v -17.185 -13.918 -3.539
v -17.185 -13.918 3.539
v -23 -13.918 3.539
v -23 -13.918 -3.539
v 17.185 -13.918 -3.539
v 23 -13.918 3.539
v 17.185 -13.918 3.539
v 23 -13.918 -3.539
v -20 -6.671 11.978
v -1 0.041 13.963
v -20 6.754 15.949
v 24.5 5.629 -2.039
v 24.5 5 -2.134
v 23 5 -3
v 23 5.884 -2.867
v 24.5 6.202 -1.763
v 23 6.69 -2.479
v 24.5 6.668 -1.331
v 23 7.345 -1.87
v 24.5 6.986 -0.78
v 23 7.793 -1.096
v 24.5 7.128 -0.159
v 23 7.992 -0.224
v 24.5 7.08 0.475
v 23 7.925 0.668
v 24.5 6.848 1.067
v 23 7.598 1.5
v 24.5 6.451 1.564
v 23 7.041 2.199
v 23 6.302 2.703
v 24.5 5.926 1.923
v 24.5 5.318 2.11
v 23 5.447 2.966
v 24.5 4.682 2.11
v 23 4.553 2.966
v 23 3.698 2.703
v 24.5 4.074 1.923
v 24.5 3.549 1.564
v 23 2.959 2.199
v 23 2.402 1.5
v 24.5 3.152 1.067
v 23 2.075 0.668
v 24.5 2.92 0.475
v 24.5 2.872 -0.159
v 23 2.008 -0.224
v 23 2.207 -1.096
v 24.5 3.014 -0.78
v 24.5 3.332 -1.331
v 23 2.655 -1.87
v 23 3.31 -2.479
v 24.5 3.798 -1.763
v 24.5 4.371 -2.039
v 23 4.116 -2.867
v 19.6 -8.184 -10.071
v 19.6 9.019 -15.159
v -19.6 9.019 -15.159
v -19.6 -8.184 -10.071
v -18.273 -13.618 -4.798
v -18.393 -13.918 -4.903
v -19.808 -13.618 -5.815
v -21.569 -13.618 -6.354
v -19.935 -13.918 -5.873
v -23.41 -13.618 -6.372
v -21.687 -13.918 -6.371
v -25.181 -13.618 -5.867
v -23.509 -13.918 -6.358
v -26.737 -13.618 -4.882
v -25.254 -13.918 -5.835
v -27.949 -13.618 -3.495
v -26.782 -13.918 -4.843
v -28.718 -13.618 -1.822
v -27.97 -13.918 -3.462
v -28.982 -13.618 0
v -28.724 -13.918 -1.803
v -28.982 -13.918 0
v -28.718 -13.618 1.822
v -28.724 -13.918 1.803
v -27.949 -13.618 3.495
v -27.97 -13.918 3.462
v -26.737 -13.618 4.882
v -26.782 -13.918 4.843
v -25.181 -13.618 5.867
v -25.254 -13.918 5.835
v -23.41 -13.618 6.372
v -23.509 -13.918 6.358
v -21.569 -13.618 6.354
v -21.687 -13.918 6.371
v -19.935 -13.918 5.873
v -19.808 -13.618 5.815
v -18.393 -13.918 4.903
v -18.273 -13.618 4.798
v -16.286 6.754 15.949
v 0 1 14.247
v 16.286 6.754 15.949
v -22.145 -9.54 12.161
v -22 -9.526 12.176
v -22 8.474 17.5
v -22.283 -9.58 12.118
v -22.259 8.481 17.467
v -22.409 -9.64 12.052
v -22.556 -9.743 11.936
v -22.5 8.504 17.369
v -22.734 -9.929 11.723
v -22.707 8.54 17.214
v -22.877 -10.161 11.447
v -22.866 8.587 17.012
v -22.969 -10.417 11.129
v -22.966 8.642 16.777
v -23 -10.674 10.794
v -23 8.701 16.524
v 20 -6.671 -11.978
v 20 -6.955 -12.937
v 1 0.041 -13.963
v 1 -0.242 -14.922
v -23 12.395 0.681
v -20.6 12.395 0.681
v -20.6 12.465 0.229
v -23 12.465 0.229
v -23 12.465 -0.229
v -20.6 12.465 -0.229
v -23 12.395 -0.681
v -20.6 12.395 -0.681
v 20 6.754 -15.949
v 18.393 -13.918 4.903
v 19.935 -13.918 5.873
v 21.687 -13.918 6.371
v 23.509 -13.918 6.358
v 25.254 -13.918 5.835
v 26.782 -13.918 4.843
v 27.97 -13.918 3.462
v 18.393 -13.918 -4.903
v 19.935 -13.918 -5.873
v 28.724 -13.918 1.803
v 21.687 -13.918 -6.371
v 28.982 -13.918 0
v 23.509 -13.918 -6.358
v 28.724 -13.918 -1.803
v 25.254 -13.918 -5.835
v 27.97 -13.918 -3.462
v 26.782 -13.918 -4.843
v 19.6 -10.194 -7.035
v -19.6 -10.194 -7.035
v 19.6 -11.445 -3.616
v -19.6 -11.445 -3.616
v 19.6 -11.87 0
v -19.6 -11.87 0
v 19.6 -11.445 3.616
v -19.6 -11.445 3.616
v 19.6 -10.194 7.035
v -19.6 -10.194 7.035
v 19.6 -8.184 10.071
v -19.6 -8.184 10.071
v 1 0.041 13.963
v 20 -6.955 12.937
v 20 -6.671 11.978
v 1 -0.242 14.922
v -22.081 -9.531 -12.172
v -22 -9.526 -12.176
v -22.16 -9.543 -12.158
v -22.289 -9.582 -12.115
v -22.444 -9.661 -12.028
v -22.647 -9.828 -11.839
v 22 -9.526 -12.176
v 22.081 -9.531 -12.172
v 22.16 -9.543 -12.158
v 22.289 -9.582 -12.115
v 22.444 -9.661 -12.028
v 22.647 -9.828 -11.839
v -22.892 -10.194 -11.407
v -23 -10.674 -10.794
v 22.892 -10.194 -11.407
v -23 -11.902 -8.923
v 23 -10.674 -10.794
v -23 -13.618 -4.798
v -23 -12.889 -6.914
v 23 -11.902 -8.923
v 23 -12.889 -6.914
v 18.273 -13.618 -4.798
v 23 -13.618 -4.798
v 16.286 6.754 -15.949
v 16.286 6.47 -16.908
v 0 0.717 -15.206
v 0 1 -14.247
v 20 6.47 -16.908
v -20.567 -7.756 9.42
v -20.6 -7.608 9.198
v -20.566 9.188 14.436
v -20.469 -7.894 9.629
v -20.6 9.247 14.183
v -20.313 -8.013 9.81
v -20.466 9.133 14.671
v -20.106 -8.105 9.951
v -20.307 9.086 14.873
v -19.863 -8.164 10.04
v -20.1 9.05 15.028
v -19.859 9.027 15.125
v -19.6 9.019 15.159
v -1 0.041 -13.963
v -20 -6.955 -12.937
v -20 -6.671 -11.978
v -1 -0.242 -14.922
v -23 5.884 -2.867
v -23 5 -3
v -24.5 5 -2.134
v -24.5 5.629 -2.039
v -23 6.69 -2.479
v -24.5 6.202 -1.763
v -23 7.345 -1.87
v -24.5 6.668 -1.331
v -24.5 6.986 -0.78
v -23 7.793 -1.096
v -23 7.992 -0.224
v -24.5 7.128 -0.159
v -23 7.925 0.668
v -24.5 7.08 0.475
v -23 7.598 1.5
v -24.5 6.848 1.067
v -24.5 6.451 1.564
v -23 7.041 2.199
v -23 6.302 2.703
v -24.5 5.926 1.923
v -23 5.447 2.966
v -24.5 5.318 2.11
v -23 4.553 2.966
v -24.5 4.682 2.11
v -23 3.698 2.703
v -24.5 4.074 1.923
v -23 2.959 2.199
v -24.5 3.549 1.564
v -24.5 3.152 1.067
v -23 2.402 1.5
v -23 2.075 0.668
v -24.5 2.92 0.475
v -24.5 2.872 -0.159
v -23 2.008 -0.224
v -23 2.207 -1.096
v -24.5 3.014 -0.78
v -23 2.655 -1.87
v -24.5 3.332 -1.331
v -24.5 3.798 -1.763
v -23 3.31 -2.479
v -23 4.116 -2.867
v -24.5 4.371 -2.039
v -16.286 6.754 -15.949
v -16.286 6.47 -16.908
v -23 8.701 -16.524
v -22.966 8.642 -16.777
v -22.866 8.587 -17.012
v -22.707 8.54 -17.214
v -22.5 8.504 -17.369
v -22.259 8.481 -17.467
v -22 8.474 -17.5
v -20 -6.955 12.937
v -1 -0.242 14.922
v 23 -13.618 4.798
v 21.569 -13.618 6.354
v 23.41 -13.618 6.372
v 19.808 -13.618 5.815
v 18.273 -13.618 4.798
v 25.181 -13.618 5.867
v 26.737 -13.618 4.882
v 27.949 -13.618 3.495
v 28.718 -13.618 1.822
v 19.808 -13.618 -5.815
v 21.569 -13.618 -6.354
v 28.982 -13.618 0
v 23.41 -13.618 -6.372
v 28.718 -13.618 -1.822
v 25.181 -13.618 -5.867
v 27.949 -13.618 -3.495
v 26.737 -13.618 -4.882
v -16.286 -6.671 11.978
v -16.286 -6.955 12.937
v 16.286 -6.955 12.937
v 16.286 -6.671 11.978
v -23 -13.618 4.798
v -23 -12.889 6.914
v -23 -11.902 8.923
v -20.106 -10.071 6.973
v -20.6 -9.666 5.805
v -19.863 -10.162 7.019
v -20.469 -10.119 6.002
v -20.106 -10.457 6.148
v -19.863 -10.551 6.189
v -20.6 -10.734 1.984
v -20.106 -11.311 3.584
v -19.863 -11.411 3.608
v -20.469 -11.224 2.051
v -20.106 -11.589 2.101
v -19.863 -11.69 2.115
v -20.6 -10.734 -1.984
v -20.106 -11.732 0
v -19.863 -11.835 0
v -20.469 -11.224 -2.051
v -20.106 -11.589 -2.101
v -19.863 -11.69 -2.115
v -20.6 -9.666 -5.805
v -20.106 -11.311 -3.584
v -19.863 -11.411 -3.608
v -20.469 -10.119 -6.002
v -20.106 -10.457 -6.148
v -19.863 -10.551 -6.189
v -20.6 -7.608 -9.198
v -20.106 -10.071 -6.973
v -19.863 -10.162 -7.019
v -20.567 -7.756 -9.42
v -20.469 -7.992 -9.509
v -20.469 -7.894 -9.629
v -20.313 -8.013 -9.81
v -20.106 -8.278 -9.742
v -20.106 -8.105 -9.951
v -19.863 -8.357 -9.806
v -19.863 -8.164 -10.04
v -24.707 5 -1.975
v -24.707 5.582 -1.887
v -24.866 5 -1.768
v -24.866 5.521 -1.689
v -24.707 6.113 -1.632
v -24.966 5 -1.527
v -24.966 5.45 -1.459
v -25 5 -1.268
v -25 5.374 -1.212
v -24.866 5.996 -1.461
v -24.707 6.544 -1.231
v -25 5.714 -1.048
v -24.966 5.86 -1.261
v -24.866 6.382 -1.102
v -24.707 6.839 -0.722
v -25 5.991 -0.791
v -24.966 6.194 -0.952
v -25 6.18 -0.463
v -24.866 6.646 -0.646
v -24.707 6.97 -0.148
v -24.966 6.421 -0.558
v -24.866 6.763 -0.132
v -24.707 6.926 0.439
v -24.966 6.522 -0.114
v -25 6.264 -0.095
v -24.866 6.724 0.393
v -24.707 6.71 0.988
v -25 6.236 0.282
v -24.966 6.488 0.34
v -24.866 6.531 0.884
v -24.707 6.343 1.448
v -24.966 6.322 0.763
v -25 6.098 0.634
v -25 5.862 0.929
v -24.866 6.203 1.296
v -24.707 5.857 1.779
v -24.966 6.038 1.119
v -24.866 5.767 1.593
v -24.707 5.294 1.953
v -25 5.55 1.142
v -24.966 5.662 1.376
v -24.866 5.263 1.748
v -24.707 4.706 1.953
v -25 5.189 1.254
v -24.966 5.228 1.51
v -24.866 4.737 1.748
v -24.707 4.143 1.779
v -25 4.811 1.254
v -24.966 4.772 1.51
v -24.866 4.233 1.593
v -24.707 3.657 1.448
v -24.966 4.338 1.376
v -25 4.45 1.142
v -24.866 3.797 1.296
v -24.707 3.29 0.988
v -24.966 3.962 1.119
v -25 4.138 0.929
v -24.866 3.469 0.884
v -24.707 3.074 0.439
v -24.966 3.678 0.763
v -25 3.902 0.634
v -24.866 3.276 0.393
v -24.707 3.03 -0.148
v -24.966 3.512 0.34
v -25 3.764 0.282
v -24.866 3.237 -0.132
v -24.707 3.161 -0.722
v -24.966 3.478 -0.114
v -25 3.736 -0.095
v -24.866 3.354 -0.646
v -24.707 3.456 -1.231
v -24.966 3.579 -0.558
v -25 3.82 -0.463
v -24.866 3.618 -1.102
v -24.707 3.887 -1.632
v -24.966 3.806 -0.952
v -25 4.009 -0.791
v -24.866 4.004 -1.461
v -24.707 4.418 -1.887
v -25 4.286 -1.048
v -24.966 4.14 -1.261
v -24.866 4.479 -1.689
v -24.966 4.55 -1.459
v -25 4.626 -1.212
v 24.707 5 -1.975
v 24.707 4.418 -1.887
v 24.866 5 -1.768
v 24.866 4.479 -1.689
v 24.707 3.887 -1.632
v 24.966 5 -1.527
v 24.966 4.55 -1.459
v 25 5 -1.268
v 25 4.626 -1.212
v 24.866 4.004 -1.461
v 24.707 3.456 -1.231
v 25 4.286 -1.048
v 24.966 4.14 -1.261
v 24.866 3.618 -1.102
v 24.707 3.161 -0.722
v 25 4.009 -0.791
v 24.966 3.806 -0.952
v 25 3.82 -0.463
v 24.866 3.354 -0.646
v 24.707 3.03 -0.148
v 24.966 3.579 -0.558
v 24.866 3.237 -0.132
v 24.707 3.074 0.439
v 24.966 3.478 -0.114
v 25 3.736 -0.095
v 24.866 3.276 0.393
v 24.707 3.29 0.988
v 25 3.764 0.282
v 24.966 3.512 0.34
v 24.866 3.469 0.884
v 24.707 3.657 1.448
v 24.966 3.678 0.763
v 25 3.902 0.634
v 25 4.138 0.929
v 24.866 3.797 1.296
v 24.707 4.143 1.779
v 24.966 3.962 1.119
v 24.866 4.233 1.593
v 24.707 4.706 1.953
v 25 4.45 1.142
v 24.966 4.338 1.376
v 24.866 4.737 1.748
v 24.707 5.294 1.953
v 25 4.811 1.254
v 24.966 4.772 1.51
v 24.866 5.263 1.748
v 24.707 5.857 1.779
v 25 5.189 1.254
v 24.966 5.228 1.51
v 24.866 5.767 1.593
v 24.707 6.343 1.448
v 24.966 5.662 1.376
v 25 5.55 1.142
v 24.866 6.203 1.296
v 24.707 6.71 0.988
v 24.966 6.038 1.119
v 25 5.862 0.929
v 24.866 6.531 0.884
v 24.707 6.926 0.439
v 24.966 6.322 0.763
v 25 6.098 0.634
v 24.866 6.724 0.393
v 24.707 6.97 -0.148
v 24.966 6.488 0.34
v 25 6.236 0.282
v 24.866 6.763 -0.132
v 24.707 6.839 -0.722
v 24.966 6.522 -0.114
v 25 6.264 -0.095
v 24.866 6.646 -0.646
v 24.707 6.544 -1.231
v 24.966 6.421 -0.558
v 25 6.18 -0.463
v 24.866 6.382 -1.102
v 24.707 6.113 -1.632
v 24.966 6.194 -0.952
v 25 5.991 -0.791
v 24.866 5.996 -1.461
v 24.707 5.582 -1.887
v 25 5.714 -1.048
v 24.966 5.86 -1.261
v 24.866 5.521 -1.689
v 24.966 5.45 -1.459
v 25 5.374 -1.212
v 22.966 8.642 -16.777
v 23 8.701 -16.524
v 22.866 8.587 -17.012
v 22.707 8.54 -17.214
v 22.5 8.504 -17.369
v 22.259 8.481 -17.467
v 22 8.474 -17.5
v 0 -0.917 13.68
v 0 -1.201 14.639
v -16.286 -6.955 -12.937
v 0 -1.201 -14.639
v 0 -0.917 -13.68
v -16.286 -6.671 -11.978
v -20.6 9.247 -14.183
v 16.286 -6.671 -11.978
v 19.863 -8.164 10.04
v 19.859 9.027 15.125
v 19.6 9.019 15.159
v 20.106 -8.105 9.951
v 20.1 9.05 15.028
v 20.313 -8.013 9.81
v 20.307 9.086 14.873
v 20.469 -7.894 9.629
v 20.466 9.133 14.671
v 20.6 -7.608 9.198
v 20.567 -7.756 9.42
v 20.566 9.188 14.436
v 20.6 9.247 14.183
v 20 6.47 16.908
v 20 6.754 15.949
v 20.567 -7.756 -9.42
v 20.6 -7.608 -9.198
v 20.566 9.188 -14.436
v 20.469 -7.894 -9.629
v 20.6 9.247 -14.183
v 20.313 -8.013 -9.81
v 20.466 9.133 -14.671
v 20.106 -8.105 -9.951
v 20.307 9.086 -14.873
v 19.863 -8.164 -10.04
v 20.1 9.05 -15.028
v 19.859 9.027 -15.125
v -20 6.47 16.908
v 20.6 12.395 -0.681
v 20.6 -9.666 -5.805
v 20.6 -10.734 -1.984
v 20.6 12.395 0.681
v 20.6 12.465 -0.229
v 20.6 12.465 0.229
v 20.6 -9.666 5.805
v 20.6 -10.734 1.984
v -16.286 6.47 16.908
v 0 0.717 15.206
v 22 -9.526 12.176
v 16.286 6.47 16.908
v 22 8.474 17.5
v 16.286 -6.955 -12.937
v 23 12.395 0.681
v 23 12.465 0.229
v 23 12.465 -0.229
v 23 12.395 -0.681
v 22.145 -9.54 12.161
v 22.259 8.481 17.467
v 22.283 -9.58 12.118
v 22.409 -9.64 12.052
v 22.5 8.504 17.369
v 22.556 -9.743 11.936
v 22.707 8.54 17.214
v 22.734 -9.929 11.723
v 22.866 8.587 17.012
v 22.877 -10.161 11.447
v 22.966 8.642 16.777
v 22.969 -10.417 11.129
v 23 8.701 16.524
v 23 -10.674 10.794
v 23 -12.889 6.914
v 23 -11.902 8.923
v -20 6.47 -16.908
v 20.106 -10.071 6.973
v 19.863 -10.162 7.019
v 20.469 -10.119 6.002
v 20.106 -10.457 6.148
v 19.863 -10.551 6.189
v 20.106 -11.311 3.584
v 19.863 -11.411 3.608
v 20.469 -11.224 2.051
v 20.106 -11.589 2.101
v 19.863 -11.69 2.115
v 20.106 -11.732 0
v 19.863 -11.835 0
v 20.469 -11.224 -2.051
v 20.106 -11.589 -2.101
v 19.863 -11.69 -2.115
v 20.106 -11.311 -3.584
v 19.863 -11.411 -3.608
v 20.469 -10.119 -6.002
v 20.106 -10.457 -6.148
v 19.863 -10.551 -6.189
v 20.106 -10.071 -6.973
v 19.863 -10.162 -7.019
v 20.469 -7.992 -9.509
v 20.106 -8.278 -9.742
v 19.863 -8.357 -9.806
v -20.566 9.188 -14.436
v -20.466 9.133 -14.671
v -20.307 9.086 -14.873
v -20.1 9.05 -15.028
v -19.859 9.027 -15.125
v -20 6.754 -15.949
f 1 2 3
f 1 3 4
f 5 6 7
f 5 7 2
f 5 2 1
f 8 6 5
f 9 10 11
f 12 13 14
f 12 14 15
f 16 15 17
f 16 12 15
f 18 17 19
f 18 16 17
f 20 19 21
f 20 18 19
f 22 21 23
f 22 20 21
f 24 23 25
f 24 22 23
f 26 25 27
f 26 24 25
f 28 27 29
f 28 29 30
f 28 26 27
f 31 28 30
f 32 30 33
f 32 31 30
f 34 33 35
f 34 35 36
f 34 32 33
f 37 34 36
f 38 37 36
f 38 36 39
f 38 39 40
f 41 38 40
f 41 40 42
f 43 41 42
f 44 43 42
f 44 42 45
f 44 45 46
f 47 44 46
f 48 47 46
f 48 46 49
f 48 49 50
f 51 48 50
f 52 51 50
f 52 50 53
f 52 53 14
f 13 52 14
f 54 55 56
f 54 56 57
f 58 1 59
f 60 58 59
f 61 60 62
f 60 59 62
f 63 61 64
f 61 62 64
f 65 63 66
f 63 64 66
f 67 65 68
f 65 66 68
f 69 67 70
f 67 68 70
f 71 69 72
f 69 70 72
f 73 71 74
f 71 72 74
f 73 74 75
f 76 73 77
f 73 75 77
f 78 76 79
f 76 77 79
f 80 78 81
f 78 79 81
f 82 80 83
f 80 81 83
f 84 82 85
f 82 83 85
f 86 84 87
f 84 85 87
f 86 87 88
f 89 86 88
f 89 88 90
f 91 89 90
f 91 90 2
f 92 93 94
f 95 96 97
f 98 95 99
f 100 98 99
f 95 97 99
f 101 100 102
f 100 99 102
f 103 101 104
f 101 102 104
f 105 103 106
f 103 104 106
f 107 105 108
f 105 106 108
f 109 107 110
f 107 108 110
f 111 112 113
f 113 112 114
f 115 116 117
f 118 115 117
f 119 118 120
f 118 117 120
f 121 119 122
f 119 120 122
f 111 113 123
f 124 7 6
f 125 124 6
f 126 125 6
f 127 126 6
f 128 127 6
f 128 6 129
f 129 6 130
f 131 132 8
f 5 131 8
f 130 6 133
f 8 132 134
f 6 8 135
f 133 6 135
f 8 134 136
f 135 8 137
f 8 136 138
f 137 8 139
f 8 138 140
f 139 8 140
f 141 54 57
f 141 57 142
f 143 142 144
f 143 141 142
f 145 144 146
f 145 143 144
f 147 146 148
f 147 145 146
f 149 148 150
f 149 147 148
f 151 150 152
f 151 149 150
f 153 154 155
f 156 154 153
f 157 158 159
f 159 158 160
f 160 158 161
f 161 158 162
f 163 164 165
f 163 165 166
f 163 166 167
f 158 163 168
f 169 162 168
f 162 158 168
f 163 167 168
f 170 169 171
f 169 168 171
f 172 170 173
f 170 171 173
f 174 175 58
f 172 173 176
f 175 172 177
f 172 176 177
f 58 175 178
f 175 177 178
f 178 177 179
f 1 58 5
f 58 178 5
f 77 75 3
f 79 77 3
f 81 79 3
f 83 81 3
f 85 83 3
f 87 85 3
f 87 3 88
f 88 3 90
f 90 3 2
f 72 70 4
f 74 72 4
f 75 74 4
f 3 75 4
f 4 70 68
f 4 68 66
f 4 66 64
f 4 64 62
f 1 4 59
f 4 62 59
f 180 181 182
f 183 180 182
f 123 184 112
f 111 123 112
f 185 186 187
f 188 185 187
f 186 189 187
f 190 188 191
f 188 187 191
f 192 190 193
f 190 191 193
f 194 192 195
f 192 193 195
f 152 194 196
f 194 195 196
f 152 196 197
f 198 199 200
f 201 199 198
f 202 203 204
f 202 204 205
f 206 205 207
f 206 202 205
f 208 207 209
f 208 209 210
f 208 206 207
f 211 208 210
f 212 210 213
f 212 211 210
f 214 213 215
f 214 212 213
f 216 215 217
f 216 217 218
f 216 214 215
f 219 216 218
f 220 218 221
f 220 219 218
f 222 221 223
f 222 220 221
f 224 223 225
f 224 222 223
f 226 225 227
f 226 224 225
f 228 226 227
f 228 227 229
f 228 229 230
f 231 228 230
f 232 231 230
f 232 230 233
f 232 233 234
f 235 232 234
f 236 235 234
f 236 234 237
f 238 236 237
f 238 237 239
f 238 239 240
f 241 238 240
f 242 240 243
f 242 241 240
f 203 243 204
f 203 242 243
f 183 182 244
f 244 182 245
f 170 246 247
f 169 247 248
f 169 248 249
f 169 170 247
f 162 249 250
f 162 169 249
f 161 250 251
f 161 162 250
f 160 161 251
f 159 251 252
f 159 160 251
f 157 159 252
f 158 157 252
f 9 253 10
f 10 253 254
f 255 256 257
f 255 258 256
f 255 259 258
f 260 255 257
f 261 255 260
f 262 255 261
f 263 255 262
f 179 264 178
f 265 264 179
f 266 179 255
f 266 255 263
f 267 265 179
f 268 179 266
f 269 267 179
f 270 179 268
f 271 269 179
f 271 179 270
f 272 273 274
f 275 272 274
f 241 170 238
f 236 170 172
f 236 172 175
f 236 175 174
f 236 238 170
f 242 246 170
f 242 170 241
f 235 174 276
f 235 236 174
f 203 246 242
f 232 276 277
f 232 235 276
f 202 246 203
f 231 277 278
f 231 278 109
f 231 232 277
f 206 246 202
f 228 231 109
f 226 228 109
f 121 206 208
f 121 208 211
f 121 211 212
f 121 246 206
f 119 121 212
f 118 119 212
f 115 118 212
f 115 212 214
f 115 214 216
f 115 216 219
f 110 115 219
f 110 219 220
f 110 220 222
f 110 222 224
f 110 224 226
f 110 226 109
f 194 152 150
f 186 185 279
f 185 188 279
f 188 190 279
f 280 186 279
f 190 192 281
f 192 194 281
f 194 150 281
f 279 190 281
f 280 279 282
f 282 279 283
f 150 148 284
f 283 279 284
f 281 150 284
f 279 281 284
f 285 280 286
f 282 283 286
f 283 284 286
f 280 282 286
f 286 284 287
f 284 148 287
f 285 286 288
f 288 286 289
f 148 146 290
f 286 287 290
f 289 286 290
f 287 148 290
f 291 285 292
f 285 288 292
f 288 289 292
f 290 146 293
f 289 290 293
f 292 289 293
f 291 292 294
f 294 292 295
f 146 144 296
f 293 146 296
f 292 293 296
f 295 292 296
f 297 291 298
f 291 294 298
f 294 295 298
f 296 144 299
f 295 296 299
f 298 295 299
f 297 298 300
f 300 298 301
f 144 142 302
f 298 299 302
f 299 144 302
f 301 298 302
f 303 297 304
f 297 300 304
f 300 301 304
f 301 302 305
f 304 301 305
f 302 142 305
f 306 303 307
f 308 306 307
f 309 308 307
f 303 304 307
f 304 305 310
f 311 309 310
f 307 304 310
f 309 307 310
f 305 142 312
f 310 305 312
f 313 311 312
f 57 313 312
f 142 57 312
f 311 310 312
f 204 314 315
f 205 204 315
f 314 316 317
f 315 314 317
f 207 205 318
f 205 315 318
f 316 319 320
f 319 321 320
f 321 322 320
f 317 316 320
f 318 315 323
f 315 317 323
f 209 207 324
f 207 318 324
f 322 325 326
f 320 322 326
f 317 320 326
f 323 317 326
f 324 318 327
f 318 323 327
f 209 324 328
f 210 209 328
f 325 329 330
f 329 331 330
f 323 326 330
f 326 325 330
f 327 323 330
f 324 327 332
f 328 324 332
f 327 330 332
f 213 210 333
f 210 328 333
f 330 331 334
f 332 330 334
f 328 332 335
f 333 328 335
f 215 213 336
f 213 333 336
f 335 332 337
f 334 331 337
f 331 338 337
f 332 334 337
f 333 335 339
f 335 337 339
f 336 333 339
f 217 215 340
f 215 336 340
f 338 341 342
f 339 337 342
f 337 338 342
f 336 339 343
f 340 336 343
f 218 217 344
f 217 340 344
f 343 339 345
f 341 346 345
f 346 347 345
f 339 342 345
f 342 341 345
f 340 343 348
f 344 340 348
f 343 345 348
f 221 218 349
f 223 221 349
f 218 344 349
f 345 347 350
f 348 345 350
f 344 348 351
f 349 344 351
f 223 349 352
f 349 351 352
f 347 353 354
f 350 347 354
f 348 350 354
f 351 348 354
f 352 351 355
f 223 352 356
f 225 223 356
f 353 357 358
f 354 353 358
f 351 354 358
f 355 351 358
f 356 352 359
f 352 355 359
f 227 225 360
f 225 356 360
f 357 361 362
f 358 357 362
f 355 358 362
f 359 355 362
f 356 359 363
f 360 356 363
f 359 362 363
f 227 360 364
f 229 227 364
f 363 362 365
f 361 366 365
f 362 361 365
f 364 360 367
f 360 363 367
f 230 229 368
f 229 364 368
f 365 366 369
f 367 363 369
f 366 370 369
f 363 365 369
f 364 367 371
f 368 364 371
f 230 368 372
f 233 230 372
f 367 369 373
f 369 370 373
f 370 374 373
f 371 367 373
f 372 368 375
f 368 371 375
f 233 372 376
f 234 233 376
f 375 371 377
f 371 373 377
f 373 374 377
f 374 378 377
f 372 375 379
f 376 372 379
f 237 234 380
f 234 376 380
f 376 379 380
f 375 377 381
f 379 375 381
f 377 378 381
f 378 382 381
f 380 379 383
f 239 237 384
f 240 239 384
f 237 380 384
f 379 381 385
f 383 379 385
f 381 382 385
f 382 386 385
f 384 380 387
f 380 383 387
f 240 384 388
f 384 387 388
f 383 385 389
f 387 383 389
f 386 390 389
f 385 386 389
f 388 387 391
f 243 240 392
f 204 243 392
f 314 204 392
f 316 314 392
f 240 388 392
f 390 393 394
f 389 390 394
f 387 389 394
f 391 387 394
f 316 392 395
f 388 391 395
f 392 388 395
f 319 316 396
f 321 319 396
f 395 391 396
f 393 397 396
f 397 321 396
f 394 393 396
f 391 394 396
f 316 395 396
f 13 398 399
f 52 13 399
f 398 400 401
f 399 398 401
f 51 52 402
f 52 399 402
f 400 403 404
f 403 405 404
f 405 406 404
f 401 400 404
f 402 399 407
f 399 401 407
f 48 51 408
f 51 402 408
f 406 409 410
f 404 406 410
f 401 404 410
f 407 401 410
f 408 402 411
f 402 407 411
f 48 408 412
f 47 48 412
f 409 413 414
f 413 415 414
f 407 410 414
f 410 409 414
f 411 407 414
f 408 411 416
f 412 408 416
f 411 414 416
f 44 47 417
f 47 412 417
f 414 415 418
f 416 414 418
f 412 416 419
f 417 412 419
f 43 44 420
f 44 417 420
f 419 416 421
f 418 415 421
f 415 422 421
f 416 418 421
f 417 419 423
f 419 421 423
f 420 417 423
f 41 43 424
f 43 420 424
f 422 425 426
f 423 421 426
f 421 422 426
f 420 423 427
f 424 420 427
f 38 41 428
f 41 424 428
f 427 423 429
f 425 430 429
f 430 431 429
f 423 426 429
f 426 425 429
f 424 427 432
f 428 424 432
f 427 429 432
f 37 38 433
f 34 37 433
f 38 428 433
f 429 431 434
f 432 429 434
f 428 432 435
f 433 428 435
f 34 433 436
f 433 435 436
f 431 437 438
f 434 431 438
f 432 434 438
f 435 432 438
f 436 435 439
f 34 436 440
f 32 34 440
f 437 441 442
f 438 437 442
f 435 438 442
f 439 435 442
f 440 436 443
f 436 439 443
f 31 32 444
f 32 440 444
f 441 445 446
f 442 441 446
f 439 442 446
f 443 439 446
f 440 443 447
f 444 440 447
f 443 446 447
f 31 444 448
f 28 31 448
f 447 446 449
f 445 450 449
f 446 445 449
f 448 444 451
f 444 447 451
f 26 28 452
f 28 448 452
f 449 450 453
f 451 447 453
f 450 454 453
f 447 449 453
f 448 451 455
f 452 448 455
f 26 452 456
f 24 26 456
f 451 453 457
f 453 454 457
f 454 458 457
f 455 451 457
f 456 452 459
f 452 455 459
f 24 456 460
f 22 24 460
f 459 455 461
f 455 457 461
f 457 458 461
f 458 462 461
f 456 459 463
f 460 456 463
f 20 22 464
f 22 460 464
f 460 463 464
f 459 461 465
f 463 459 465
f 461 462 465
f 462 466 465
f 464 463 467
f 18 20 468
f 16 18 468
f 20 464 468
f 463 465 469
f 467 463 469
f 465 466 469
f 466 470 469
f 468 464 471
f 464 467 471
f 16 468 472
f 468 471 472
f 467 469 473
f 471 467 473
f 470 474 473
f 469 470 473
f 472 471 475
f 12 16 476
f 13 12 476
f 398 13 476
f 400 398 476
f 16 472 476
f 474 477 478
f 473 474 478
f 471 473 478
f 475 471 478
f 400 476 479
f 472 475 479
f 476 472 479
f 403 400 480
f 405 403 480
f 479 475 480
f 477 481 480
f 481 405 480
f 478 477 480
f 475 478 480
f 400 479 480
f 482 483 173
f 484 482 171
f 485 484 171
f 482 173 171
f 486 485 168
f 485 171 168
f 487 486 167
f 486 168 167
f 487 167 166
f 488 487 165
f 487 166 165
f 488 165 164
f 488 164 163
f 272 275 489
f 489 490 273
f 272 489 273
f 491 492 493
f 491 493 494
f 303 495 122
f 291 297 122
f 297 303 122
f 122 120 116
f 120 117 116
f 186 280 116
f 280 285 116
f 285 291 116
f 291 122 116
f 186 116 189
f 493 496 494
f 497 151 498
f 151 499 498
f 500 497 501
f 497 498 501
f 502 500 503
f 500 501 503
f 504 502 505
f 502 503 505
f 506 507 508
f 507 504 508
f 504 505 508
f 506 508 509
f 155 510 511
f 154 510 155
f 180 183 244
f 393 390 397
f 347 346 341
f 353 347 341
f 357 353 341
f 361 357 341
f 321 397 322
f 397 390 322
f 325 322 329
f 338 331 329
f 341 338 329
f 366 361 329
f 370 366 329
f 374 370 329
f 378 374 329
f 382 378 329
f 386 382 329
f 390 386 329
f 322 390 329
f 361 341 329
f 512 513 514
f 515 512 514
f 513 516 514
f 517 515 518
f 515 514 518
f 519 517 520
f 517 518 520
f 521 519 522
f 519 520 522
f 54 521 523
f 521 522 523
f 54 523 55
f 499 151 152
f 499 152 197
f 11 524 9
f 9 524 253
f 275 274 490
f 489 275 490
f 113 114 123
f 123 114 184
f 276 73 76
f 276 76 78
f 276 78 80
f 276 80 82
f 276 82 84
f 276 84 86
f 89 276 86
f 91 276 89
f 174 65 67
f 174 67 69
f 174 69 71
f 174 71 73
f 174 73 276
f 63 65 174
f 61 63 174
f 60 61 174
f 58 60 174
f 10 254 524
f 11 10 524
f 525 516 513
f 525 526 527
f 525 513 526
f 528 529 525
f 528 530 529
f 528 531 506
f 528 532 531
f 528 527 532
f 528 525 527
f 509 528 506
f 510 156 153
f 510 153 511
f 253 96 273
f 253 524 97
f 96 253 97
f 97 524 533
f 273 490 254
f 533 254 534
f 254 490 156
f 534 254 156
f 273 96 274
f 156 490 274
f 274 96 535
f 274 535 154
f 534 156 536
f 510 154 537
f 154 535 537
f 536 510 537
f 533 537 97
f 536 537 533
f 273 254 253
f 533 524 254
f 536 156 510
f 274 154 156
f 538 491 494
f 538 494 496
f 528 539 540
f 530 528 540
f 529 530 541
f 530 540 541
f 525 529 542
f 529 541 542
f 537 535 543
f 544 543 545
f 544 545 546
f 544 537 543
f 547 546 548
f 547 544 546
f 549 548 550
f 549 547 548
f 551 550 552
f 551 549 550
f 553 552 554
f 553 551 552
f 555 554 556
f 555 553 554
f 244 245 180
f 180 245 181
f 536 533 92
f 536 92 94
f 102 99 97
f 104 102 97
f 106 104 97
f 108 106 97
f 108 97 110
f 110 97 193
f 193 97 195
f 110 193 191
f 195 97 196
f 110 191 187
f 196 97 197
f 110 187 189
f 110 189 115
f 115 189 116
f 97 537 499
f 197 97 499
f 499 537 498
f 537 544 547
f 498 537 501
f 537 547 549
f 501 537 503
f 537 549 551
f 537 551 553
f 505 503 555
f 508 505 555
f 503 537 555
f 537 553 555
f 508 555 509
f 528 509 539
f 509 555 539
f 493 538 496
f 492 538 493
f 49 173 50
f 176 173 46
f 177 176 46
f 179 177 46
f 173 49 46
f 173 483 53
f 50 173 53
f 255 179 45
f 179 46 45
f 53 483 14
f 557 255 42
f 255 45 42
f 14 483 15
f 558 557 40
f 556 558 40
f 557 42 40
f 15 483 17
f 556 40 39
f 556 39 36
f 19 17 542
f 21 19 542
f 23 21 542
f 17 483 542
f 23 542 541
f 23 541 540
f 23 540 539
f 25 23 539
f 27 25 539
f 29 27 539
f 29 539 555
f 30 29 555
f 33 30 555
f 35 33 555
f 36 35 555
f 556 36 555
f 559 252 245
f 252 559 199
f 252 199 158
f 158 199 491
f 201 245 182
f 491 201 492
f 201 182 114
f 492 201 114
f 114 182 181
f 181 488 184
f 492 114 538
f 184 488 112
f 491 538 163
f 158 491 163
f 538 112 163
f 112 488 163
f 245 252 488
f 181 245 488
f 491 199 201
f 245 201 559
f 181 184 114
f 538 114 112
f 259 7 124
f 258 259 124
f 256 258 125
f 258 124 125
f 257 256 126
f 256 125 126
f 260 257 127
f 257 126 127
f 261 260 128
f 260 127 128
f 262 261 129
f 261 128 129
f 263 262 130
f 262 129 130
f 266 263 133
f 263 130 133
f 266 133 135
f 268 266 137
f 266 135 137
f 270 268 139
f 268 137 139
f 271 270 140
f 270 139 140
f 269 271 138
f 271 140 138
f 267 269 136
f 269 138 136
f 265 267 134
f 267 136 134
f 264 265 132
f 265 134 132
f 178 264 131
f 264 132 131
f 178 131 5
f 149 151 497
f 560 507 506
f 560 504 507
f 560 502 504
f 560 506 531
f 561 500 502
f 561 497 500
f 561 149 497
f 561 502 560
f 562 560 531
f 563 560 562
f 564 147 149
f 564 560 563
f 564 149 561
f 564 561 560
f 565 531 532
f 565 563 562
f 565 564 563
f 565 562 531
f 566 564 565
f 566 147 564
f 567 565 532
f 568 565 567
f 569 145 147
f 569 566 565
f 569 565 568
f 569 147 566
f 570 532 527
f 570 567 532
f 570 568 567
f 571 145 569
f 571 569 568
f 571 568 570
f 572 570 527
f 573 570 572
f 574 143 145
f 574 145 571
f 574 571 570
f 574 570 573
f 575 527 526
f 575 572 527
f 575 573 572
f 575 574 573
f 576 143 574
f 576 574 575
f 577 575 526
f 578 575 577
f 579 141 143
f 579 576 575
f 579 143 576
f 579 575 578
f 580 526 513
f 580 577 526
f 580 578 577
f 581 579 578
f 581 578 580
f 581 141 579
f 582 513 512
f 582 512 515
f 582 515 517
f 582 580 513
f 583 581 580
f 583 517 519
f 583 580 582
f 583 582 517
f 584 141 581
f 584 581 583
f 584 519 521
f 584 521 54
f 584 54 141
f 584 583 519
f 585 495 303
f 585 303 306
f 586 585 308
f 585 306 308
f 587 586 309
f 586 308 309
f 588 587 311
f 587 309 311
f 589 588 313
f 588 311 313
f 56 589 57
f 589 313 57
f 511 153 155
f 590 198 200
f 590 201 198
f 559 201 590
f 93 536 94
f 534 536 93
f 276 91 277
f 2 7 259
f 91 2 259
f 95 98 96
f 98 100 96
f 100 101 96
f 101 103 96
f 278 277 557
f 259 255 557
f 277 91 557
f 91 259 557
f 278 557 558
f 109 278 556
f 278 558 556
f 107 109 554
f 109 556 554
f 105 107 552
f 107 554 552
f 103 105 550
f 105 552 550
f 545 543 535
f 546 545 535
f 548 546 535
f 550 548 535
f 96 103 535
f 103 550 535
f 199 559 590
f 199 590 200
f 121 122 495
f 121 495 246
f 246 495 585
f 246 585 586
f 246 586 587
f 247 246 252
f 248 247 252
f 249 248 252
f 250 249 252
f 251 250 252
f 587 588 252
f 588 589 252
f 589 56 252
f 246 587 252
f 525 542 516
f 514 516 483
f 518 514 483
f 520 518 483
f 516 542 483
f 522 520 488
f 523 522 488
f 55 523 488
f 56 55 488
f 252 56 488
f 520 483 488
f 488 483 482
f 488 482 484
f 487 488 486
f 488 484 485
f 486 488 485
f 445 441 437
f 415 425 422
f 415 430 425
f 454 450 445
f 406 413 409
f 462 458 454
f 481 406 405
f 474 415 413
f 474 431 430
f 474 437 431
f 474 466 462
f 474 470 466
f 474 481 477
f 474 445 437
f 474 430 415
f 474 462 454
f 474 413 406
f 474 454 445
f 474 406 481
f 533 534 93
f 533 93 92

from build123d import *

# Parameters (mm, degrees)
BOSS_EXTRUDE1_DEPTH = 23
SHELL1_T            = -2.4
BOSS_EXTRUDE2_START = 23
SKETCH2_R           = 3
BOSS_EXTRUDE2_DEPTH = 2
BOSS_EXTRUDE2_TAPER = 30
BOSS_EXTRUDE3_START = -23
SKETCH2_2_R         = 3
BOSS_EXTRUDE3_DEPTH = 2
BOSS_EXTRUDE3_DRAFT = -30
FILLET1_R           = 1
CUT_EXTRUDE1_DEPTH  = 1
SKETCH4_W           = 40.50345243
SKETCH4_H           = 8.465012935
CUT_EXTRUDE2_DEPTH  = 50
BOSS_EXTRUDE4_START = -13.918462
SKETCH5_R           = 6.429553597
BOSS_EXTRUDE4_DEPTH = 0.3
FILLET2_R           = 1


with BuildPart() as part:
    # Sketch1 → Boss-Extrude1 (new, symmetric)
    with BuildSketch(Plane(origin=(0, 0, 0), x_dir=(0, 0, -1), z_dir=(1, 0, 0))):
        with BuildLine():
            Line((-12.176285942, -9.526430091), (-17.5, 8.473569909))
            Line((-17.5, 8.473569909), (-0.681235958, 12.395199175))
            ThreePointArc((-0.681235958, 12.395199175), (0, 12.473569909), (0.681235958, 12.395199175))
            Line((0.681235958, 12.395199175), (17.5, 8.473569909))
            Line((17.5, 8.473569909), (12.176285942, -9.526430091))
            ThreePointArc((12.176285942, -9.526430091), (0, -14.269806816), (-12.176285942, -9.526430091))
        make_face()
    extrude(amount=BOSS_EXTRUDE1_DEPTH, both=True)

    # Shell1
    shell1_openings = [part.faces().sort_by_distance(p)[0] for p in [
        (0, 10.434384542, 9.090617979),
        (0, 12.473569909, 0),
        (0, 10.434384542, -9.090617979),
    ]]
    offset(amount=SHELL1_T, openings=shell1_openings, kind=Kind.INTERSECTION)

    # Sketch2 → Boss-Extrude2 (add)
    with BuildSketch(Plane(origin=(0, 0, 0), x_dir=(0, 0, -1), z_dir=(1, 0, 0)).offset(BOSS_EXTRUDE2_START)):
        with Locations((0, 5)):
            Circle(SKETCH2_R)
    extrude(amount=BOSS_EXTRUDE2_DEPTH, taper=BOSS_EXTRUDE2_TAPER)


with BuildPart() as boss_extrude3_tool:
    # Sketch2<2> → Boss-Extrude3 (with draft: the straight prism first)
    with BuildSketch(Plane(origin=(0, 0, 0), x_dir=(0, 0, -1), z_dir=(1, 0, 0)).offset(BOSS_EXTRUDE3_START)):
        with Locations((0, 5)):
            Circle(SKETCH2_2_R)
    extrude(amount=-BOSS_EXTRUDE3_DEPTH)
    # Boss-Extrude3: the draft: its side faces are tilted about the plane it starts from
    boss_extrude3_sides = [boss_extrude3_tool.faces().sort_by_distance(p)[0] for p in [
        (-24, 5, 3),
    ]]
    draft(boss_extrude3_sides, Plane(origin=(0, 0, 0), x_dir=(0, 0, -1), z_dir=(1, 0, 0)).offset(BOSS_EXTRUDE3_START), BOSS_EXTRUDE3_DRAFT)


with BuildPart() as part_1:
    add(part.part)

    # Boss-Extrude3: add boss_extrude3_tool
    add(boss_extrude3_tool.part)

    # Fillet1
    fillet1_edges = [part_1.edges().sort_by_distance(p)[0] for p in [
        (23, -0.526430091, 14.838142971),
        (-20.6, -11.869806816, 0),
        (-20.6, 0.417860611, -12.614658399),
        (-20.6, 0.417860611, 12.614658399),
        (20.6, -11.869806816, 0),
        (20.6, 0.417860611, -12.614658399),
        (20.6, 0.417860611, 12.614658399),
        (-23, -0.526430091, 14.838142971),
        (23, -0.526430091, -14.838142971),
        (-23, -0.526430091, -14.838142971),
    ]]
    fillet(fillet1_edges, radius=FILLET1_R)

    # Sketch3 → Cut-Extrude1 (cut)
    with BuildSketch(Plane(origin=(0, -99.309611189, -14.378157577), x_dir=(1, 0, 0), z_dir=(0, 0.28361719382763534, -0.9589375826222152))):
        Polygon((-20, -96.309611189), (-1, -103.309611189), (-20, -110.309611189), align=None)
        Polygon((20, -110.309611189), (20, -96.309611189), (1, -103.309611189), align=None)
        Polygon((-16.285714286, -96.309611189), (16.285714286, -96.309611189), (0, -102.309611189), align=None)
        Polygon((-16.285714286, -110.309611189), (16.285714286, -110.309611189), (0, -104.309611189), align=None)
    cut_extrude1 = extrude(amount=CUT_EXTRUDE1_DEPTH, mode=Mode.SUBTRACT)

    # Mirror1: Cut-Extrude1 across plane
    add(cut_extrude1.mirror(Plane.XY), mode=Mode.SUBTRACT)

    # Sketch4 → Cut-Extrude2 (cut, symmetric)
    with BuildSketch(Plane(origin=(0, 0, 0), x_dir=(0, 0, -1), z_dir=(1, 0, 0))):
        with Locations((0, -18.150968344)):
            Rectangle(SKETCH4_W, SKETCH4_H)
    extrude(amount=CUT_EXTRUDE2_DEPTH, both=True, mode=Mode.SUBTRACT)

    # Sketch5 → Boss-Extrude4 (add)
    with BuildSketch(Plane(origin=(0, 0, 0), x_dir=(1, 0, 0), z_dir=(0, 1, 0)).offset(BOSS_EXTRUDE4_START)):
        with Locations((22.552407332, 0)):
            Circle(SKETCH5_R)
        with Locations((-22.552407332, 0)):
            Circle(SKETCH5_R)
    extrude(amount=BOSS_EXTRUDE4_DEPTH)

    # Fillet2
    fillet2_edges = [part_1.edges().sort_by_distance(p)[0] for p in [
        (25, 5, 1.845299462),
        (-25, 5, 1.845299462),
    ]]
    fillet(fillet2_edges, radius=FILLET2_R)


solid = part_1.part
